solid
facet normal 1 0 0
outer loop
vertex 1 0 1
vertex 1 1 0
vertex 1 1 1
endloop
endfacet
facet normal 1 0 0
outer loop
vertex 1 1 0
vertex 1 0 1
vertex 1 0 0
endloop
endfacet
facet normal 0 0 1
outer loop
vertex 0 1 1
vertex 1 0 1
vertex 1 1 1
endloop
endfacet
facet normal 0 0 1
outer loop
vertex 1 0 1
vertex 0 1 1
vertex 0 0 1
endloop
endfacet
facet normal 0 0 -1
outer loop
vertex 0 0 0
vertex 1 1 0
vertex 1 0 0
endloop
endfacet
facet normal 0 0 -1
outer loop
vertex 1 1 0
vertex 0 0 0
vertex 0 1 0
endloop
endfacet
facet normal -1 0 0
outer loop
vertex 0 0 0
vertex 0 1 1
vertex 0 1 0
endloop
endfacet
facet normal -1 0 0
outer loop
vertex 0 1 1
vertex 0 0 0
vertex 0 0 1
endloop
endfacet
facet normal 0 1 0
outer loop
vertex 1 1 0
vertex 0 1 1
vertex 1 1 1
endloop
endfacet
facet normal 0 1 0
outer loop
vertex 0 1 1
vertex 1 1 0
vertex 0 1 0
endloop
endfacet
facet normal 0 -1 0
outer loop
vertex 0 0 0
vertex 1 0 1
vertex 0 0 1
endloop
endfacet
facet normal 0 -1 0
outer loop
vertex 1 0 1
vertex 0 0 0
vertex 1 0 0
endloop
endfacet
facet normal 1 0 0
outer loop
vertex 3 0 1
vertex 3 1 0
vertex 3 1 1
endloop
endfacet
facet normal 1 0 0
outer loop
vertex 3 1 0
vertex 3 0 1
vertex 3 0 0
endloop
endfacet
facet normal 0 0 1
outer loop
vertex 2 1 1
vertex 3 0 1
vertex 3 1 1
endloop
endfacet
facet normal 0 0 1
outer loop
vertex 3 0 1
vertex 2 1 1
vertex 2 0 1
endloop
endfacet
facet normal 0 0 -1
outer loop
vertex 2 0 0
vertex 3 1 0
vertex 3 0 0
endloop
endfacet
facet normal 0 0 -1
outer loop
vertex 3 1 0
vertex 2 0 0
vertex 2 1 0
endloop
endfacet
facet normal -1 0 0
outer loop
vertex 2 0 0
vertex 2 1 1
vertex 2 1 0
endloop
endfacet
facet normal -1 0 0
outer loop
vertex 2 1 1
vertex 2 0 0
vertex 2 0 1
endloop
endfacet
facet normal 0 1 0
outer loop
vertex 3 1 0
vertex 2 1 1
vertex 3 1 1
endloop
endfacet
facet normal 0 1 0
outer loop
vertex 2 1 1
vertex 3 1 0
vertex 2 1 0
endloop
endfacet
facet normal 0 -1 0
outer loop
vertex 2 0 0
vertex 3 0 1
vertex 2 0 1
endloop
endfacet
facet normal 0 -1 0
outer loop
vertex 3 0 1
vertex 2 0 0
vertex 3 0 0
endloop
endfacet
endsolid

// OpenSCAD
color("red")
    render()
        color("blue")
            cube();

#translate([2, 0, 0])
    render()
        color("blue")
            cube();


%translate([4, 0, 0])
    render()
        color("blue")
            cube();
